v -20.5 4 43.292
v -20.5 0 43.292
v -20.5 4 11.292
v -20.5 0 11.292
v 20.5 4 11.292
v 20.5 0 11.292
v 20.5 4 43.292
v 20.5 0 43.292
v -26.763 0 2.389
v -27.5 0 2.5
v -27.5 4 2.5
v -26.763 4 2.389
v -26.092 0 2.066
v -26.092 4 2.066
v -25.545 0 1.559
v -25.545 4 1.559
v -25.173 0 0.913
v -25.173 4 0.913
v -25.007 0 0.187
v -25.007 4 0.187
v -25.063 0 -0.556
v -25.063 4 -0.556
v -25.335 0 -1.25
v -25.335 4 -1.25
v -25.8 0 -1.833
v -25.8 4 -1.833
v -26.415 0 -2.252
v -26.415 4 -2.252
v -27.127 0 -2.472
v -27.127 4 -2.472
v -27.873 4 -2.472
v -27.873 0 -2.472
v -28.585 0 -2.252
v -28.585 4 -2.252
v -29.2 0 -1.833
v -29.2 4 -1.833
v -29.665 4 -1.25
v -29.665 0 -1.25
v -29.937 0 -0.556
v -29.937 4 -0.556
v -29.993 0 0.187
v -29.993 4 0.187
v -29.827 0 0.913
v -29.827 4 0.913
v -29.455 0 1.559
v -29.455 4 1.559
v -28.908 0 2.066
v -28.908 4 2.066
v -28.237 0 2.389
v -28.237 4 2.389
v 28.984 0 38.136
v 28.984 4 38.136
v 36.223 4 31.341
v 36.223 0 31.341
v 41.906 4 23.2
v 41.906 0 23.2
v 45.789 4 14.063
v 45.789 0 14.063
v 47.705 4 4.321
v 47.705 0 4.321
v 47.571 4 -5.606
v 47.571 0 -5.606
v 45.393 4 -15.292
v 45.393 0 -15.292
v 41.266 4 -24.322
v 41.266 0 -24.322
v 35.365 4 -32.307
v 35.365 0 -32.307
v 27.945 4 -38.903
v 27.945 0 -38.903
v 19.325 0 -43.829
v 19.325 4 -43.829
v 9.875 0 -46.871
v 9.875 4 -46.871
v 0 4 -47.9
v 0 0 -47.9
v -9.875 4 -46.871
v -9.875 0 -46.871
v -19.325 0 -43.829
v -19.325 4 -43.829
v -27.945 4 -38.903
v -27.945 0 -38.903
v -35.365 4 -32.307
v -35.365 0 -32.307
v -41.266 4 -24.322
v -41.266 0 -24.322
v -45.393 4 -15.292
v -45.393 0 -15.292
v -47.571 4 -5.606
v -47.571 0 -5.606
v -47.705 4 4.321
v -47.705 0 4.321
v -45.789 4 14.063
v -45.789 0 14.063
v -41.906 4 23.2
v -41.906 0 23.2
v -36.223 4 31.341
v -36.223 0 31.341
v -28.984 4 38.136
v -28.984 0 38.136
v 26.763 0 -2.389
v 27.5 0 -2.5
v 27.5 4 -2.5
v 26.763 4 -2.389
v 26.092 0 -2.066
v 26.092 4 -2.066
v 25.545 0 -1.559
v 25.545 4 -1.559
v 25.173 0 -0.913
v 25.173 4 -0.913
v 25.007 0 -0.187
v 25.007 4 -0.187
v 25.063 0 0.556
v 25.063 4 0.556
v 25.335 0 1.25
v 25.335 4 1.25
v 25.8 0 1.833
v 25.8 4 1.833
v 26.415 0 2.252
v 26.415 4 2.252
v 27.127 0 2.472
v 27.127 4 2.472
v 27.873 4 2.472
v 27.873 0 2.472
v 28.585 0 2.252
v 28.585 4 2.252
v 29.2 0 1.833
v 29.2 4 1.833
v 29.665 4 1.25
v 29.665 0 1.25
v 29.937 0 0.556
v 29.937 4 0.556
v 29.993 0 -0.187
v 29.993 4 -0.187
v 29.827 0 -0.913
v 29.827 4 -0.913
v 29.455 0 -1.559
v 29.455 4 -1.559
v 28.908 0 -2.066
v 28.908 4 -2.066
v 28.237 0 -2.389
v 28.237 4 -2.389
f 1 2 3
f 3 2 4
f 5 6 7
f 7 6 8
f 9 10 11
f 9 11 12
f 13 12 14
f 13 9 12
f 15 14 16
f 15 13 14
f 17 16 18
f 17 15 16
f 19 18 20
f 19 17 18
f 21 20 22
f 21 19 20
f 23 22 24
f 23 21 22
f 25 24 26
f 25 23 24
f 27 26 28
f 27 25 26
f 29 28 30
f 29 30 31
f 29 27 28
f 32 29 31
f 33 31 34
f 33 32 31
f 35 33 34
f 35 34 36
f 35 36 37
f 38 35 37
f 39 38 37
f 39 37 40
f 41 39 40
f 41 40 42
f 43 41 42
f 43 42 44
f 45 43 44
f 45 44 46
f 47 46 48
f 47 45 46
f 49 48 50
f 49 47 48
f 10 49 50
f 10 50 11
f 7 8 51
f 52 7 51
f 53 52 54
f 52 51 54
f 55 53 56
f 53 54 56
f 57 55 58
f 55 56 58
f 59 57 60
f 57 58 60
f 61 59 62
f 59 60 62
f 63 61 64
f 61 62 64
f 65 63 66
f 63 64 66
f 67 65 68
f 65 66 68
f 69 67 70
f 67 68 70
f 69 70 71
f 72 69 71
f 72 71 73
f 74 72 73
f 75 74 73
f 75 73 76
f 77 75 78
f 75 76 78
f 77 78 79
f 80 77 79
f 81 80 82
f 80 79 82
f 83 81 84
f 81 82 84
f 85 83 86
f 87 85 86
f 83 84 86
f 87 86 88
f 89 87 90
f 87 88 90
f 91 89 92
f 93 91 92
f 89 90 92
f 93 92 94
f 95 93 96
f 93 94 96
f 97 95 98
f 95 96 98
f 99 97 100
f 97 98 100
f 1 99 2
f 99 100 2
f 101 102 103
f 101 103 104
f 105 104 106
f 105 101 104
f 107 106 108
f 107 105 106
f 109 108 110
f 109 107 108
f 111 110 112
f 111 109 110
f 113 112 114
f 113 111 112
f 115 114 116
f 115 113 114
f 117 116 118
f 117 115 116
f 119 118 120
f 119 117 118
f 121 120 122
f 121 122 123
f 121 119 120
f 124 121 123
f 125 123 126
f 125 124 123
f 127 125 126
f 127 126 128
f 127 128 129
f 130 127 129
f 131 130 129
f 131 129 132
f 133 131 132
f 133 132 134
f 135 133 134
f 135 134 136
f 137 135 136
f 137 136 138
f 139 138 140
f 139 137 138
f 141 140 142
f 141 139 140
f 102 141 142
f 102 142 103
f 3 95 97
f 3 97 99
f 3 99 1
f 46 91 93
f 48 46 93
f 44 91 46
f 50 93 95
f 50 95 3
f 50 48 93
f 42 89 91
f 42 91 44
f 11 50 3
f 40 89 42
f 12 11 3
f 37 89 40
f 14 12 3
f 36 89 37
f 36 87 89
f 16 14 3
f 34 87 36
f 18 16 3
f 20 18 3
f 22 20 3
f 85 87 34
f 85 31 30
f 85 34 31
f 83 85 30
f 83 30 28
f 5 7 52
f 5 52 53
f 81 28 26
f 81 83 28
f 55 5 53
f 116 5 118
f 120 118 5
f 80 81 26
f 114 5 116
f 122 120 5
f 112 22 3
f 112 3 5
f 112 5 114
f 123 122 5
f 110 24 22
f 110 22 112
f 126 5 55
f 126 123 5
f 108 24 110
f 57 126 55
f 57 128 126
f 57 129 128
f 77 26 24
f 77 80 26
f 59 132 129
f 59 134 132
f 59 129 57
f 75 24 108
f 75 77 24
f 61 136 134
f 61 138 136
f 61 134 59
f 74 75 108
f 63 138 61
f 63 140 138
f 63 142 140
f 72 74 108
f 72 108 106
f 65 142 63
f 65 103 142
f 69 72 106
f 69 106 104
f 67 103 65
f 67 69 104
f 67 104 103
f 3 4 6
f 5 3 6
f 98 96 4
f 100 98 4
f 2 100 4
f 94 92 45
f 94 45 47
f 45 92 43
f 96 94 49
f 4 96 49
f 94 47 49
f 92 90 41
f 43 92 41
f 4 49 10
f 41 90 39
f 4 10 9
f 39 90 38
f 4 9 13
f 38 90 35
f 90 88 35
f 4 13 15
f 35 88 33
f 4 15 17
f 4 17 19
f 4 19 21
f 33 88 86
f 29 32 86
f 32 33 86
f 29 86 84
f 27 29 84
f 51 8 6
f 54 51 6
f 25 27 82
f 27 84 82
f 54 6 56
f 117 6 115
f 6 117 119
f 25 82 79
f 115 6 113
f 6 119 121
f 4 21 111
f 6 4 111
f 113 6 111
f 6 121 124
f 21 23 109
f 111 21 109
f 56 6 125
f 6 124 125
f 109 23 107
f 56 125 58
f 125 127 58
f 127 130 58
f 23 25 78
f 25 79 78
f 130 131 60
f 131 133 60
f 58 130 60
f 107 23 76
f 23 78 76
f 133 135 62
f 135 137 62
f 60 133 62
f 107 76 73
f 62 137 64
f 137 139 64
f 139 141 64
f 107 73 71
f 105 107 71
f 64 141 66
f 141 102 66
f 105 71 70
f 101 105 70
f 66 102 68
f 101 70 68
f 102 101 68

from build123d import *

# Parameters (mm, degrees)
SKETCH1_R           = 2.5
BOSS_EXTRUDE2_DEPTH = 4


with BuildPart() as part:
    # Sketch1 → Boss-Extrude2 (new body)
    with BuildSketch(Plane(origin=(0, 0, 0), x_dir=(1, 0, 0), z_dir=(0, 1, 0))):
        with BuildLine():
            Line((-20.5, -43.291569618), (-20.5, -11.291569618))
            Line((-20.5, -11.291569618), (20.5, -11.291569618))
            Line((20.5, -11.291569618), (20.5, -43.291569618))
            ThreePointArc((20.5, -43.291569618), (0, 47.9), (-20.5, -43.291569618))
        make_face()
        with Locations(Location((-27.5, 0, 0), (0, 0, 270))):
            Circle(SKETCH1_R, mode=Mode.SUBTRACT)
        with Locations(Location((27.5, 0, 0), (0, 0, 90))):
            Circle(SKETCH1_R, mode=Mode.SUBTRACT)
    extrude(amount=BOSS_EXTRUDE2_DEPTH)


solid = part.part
